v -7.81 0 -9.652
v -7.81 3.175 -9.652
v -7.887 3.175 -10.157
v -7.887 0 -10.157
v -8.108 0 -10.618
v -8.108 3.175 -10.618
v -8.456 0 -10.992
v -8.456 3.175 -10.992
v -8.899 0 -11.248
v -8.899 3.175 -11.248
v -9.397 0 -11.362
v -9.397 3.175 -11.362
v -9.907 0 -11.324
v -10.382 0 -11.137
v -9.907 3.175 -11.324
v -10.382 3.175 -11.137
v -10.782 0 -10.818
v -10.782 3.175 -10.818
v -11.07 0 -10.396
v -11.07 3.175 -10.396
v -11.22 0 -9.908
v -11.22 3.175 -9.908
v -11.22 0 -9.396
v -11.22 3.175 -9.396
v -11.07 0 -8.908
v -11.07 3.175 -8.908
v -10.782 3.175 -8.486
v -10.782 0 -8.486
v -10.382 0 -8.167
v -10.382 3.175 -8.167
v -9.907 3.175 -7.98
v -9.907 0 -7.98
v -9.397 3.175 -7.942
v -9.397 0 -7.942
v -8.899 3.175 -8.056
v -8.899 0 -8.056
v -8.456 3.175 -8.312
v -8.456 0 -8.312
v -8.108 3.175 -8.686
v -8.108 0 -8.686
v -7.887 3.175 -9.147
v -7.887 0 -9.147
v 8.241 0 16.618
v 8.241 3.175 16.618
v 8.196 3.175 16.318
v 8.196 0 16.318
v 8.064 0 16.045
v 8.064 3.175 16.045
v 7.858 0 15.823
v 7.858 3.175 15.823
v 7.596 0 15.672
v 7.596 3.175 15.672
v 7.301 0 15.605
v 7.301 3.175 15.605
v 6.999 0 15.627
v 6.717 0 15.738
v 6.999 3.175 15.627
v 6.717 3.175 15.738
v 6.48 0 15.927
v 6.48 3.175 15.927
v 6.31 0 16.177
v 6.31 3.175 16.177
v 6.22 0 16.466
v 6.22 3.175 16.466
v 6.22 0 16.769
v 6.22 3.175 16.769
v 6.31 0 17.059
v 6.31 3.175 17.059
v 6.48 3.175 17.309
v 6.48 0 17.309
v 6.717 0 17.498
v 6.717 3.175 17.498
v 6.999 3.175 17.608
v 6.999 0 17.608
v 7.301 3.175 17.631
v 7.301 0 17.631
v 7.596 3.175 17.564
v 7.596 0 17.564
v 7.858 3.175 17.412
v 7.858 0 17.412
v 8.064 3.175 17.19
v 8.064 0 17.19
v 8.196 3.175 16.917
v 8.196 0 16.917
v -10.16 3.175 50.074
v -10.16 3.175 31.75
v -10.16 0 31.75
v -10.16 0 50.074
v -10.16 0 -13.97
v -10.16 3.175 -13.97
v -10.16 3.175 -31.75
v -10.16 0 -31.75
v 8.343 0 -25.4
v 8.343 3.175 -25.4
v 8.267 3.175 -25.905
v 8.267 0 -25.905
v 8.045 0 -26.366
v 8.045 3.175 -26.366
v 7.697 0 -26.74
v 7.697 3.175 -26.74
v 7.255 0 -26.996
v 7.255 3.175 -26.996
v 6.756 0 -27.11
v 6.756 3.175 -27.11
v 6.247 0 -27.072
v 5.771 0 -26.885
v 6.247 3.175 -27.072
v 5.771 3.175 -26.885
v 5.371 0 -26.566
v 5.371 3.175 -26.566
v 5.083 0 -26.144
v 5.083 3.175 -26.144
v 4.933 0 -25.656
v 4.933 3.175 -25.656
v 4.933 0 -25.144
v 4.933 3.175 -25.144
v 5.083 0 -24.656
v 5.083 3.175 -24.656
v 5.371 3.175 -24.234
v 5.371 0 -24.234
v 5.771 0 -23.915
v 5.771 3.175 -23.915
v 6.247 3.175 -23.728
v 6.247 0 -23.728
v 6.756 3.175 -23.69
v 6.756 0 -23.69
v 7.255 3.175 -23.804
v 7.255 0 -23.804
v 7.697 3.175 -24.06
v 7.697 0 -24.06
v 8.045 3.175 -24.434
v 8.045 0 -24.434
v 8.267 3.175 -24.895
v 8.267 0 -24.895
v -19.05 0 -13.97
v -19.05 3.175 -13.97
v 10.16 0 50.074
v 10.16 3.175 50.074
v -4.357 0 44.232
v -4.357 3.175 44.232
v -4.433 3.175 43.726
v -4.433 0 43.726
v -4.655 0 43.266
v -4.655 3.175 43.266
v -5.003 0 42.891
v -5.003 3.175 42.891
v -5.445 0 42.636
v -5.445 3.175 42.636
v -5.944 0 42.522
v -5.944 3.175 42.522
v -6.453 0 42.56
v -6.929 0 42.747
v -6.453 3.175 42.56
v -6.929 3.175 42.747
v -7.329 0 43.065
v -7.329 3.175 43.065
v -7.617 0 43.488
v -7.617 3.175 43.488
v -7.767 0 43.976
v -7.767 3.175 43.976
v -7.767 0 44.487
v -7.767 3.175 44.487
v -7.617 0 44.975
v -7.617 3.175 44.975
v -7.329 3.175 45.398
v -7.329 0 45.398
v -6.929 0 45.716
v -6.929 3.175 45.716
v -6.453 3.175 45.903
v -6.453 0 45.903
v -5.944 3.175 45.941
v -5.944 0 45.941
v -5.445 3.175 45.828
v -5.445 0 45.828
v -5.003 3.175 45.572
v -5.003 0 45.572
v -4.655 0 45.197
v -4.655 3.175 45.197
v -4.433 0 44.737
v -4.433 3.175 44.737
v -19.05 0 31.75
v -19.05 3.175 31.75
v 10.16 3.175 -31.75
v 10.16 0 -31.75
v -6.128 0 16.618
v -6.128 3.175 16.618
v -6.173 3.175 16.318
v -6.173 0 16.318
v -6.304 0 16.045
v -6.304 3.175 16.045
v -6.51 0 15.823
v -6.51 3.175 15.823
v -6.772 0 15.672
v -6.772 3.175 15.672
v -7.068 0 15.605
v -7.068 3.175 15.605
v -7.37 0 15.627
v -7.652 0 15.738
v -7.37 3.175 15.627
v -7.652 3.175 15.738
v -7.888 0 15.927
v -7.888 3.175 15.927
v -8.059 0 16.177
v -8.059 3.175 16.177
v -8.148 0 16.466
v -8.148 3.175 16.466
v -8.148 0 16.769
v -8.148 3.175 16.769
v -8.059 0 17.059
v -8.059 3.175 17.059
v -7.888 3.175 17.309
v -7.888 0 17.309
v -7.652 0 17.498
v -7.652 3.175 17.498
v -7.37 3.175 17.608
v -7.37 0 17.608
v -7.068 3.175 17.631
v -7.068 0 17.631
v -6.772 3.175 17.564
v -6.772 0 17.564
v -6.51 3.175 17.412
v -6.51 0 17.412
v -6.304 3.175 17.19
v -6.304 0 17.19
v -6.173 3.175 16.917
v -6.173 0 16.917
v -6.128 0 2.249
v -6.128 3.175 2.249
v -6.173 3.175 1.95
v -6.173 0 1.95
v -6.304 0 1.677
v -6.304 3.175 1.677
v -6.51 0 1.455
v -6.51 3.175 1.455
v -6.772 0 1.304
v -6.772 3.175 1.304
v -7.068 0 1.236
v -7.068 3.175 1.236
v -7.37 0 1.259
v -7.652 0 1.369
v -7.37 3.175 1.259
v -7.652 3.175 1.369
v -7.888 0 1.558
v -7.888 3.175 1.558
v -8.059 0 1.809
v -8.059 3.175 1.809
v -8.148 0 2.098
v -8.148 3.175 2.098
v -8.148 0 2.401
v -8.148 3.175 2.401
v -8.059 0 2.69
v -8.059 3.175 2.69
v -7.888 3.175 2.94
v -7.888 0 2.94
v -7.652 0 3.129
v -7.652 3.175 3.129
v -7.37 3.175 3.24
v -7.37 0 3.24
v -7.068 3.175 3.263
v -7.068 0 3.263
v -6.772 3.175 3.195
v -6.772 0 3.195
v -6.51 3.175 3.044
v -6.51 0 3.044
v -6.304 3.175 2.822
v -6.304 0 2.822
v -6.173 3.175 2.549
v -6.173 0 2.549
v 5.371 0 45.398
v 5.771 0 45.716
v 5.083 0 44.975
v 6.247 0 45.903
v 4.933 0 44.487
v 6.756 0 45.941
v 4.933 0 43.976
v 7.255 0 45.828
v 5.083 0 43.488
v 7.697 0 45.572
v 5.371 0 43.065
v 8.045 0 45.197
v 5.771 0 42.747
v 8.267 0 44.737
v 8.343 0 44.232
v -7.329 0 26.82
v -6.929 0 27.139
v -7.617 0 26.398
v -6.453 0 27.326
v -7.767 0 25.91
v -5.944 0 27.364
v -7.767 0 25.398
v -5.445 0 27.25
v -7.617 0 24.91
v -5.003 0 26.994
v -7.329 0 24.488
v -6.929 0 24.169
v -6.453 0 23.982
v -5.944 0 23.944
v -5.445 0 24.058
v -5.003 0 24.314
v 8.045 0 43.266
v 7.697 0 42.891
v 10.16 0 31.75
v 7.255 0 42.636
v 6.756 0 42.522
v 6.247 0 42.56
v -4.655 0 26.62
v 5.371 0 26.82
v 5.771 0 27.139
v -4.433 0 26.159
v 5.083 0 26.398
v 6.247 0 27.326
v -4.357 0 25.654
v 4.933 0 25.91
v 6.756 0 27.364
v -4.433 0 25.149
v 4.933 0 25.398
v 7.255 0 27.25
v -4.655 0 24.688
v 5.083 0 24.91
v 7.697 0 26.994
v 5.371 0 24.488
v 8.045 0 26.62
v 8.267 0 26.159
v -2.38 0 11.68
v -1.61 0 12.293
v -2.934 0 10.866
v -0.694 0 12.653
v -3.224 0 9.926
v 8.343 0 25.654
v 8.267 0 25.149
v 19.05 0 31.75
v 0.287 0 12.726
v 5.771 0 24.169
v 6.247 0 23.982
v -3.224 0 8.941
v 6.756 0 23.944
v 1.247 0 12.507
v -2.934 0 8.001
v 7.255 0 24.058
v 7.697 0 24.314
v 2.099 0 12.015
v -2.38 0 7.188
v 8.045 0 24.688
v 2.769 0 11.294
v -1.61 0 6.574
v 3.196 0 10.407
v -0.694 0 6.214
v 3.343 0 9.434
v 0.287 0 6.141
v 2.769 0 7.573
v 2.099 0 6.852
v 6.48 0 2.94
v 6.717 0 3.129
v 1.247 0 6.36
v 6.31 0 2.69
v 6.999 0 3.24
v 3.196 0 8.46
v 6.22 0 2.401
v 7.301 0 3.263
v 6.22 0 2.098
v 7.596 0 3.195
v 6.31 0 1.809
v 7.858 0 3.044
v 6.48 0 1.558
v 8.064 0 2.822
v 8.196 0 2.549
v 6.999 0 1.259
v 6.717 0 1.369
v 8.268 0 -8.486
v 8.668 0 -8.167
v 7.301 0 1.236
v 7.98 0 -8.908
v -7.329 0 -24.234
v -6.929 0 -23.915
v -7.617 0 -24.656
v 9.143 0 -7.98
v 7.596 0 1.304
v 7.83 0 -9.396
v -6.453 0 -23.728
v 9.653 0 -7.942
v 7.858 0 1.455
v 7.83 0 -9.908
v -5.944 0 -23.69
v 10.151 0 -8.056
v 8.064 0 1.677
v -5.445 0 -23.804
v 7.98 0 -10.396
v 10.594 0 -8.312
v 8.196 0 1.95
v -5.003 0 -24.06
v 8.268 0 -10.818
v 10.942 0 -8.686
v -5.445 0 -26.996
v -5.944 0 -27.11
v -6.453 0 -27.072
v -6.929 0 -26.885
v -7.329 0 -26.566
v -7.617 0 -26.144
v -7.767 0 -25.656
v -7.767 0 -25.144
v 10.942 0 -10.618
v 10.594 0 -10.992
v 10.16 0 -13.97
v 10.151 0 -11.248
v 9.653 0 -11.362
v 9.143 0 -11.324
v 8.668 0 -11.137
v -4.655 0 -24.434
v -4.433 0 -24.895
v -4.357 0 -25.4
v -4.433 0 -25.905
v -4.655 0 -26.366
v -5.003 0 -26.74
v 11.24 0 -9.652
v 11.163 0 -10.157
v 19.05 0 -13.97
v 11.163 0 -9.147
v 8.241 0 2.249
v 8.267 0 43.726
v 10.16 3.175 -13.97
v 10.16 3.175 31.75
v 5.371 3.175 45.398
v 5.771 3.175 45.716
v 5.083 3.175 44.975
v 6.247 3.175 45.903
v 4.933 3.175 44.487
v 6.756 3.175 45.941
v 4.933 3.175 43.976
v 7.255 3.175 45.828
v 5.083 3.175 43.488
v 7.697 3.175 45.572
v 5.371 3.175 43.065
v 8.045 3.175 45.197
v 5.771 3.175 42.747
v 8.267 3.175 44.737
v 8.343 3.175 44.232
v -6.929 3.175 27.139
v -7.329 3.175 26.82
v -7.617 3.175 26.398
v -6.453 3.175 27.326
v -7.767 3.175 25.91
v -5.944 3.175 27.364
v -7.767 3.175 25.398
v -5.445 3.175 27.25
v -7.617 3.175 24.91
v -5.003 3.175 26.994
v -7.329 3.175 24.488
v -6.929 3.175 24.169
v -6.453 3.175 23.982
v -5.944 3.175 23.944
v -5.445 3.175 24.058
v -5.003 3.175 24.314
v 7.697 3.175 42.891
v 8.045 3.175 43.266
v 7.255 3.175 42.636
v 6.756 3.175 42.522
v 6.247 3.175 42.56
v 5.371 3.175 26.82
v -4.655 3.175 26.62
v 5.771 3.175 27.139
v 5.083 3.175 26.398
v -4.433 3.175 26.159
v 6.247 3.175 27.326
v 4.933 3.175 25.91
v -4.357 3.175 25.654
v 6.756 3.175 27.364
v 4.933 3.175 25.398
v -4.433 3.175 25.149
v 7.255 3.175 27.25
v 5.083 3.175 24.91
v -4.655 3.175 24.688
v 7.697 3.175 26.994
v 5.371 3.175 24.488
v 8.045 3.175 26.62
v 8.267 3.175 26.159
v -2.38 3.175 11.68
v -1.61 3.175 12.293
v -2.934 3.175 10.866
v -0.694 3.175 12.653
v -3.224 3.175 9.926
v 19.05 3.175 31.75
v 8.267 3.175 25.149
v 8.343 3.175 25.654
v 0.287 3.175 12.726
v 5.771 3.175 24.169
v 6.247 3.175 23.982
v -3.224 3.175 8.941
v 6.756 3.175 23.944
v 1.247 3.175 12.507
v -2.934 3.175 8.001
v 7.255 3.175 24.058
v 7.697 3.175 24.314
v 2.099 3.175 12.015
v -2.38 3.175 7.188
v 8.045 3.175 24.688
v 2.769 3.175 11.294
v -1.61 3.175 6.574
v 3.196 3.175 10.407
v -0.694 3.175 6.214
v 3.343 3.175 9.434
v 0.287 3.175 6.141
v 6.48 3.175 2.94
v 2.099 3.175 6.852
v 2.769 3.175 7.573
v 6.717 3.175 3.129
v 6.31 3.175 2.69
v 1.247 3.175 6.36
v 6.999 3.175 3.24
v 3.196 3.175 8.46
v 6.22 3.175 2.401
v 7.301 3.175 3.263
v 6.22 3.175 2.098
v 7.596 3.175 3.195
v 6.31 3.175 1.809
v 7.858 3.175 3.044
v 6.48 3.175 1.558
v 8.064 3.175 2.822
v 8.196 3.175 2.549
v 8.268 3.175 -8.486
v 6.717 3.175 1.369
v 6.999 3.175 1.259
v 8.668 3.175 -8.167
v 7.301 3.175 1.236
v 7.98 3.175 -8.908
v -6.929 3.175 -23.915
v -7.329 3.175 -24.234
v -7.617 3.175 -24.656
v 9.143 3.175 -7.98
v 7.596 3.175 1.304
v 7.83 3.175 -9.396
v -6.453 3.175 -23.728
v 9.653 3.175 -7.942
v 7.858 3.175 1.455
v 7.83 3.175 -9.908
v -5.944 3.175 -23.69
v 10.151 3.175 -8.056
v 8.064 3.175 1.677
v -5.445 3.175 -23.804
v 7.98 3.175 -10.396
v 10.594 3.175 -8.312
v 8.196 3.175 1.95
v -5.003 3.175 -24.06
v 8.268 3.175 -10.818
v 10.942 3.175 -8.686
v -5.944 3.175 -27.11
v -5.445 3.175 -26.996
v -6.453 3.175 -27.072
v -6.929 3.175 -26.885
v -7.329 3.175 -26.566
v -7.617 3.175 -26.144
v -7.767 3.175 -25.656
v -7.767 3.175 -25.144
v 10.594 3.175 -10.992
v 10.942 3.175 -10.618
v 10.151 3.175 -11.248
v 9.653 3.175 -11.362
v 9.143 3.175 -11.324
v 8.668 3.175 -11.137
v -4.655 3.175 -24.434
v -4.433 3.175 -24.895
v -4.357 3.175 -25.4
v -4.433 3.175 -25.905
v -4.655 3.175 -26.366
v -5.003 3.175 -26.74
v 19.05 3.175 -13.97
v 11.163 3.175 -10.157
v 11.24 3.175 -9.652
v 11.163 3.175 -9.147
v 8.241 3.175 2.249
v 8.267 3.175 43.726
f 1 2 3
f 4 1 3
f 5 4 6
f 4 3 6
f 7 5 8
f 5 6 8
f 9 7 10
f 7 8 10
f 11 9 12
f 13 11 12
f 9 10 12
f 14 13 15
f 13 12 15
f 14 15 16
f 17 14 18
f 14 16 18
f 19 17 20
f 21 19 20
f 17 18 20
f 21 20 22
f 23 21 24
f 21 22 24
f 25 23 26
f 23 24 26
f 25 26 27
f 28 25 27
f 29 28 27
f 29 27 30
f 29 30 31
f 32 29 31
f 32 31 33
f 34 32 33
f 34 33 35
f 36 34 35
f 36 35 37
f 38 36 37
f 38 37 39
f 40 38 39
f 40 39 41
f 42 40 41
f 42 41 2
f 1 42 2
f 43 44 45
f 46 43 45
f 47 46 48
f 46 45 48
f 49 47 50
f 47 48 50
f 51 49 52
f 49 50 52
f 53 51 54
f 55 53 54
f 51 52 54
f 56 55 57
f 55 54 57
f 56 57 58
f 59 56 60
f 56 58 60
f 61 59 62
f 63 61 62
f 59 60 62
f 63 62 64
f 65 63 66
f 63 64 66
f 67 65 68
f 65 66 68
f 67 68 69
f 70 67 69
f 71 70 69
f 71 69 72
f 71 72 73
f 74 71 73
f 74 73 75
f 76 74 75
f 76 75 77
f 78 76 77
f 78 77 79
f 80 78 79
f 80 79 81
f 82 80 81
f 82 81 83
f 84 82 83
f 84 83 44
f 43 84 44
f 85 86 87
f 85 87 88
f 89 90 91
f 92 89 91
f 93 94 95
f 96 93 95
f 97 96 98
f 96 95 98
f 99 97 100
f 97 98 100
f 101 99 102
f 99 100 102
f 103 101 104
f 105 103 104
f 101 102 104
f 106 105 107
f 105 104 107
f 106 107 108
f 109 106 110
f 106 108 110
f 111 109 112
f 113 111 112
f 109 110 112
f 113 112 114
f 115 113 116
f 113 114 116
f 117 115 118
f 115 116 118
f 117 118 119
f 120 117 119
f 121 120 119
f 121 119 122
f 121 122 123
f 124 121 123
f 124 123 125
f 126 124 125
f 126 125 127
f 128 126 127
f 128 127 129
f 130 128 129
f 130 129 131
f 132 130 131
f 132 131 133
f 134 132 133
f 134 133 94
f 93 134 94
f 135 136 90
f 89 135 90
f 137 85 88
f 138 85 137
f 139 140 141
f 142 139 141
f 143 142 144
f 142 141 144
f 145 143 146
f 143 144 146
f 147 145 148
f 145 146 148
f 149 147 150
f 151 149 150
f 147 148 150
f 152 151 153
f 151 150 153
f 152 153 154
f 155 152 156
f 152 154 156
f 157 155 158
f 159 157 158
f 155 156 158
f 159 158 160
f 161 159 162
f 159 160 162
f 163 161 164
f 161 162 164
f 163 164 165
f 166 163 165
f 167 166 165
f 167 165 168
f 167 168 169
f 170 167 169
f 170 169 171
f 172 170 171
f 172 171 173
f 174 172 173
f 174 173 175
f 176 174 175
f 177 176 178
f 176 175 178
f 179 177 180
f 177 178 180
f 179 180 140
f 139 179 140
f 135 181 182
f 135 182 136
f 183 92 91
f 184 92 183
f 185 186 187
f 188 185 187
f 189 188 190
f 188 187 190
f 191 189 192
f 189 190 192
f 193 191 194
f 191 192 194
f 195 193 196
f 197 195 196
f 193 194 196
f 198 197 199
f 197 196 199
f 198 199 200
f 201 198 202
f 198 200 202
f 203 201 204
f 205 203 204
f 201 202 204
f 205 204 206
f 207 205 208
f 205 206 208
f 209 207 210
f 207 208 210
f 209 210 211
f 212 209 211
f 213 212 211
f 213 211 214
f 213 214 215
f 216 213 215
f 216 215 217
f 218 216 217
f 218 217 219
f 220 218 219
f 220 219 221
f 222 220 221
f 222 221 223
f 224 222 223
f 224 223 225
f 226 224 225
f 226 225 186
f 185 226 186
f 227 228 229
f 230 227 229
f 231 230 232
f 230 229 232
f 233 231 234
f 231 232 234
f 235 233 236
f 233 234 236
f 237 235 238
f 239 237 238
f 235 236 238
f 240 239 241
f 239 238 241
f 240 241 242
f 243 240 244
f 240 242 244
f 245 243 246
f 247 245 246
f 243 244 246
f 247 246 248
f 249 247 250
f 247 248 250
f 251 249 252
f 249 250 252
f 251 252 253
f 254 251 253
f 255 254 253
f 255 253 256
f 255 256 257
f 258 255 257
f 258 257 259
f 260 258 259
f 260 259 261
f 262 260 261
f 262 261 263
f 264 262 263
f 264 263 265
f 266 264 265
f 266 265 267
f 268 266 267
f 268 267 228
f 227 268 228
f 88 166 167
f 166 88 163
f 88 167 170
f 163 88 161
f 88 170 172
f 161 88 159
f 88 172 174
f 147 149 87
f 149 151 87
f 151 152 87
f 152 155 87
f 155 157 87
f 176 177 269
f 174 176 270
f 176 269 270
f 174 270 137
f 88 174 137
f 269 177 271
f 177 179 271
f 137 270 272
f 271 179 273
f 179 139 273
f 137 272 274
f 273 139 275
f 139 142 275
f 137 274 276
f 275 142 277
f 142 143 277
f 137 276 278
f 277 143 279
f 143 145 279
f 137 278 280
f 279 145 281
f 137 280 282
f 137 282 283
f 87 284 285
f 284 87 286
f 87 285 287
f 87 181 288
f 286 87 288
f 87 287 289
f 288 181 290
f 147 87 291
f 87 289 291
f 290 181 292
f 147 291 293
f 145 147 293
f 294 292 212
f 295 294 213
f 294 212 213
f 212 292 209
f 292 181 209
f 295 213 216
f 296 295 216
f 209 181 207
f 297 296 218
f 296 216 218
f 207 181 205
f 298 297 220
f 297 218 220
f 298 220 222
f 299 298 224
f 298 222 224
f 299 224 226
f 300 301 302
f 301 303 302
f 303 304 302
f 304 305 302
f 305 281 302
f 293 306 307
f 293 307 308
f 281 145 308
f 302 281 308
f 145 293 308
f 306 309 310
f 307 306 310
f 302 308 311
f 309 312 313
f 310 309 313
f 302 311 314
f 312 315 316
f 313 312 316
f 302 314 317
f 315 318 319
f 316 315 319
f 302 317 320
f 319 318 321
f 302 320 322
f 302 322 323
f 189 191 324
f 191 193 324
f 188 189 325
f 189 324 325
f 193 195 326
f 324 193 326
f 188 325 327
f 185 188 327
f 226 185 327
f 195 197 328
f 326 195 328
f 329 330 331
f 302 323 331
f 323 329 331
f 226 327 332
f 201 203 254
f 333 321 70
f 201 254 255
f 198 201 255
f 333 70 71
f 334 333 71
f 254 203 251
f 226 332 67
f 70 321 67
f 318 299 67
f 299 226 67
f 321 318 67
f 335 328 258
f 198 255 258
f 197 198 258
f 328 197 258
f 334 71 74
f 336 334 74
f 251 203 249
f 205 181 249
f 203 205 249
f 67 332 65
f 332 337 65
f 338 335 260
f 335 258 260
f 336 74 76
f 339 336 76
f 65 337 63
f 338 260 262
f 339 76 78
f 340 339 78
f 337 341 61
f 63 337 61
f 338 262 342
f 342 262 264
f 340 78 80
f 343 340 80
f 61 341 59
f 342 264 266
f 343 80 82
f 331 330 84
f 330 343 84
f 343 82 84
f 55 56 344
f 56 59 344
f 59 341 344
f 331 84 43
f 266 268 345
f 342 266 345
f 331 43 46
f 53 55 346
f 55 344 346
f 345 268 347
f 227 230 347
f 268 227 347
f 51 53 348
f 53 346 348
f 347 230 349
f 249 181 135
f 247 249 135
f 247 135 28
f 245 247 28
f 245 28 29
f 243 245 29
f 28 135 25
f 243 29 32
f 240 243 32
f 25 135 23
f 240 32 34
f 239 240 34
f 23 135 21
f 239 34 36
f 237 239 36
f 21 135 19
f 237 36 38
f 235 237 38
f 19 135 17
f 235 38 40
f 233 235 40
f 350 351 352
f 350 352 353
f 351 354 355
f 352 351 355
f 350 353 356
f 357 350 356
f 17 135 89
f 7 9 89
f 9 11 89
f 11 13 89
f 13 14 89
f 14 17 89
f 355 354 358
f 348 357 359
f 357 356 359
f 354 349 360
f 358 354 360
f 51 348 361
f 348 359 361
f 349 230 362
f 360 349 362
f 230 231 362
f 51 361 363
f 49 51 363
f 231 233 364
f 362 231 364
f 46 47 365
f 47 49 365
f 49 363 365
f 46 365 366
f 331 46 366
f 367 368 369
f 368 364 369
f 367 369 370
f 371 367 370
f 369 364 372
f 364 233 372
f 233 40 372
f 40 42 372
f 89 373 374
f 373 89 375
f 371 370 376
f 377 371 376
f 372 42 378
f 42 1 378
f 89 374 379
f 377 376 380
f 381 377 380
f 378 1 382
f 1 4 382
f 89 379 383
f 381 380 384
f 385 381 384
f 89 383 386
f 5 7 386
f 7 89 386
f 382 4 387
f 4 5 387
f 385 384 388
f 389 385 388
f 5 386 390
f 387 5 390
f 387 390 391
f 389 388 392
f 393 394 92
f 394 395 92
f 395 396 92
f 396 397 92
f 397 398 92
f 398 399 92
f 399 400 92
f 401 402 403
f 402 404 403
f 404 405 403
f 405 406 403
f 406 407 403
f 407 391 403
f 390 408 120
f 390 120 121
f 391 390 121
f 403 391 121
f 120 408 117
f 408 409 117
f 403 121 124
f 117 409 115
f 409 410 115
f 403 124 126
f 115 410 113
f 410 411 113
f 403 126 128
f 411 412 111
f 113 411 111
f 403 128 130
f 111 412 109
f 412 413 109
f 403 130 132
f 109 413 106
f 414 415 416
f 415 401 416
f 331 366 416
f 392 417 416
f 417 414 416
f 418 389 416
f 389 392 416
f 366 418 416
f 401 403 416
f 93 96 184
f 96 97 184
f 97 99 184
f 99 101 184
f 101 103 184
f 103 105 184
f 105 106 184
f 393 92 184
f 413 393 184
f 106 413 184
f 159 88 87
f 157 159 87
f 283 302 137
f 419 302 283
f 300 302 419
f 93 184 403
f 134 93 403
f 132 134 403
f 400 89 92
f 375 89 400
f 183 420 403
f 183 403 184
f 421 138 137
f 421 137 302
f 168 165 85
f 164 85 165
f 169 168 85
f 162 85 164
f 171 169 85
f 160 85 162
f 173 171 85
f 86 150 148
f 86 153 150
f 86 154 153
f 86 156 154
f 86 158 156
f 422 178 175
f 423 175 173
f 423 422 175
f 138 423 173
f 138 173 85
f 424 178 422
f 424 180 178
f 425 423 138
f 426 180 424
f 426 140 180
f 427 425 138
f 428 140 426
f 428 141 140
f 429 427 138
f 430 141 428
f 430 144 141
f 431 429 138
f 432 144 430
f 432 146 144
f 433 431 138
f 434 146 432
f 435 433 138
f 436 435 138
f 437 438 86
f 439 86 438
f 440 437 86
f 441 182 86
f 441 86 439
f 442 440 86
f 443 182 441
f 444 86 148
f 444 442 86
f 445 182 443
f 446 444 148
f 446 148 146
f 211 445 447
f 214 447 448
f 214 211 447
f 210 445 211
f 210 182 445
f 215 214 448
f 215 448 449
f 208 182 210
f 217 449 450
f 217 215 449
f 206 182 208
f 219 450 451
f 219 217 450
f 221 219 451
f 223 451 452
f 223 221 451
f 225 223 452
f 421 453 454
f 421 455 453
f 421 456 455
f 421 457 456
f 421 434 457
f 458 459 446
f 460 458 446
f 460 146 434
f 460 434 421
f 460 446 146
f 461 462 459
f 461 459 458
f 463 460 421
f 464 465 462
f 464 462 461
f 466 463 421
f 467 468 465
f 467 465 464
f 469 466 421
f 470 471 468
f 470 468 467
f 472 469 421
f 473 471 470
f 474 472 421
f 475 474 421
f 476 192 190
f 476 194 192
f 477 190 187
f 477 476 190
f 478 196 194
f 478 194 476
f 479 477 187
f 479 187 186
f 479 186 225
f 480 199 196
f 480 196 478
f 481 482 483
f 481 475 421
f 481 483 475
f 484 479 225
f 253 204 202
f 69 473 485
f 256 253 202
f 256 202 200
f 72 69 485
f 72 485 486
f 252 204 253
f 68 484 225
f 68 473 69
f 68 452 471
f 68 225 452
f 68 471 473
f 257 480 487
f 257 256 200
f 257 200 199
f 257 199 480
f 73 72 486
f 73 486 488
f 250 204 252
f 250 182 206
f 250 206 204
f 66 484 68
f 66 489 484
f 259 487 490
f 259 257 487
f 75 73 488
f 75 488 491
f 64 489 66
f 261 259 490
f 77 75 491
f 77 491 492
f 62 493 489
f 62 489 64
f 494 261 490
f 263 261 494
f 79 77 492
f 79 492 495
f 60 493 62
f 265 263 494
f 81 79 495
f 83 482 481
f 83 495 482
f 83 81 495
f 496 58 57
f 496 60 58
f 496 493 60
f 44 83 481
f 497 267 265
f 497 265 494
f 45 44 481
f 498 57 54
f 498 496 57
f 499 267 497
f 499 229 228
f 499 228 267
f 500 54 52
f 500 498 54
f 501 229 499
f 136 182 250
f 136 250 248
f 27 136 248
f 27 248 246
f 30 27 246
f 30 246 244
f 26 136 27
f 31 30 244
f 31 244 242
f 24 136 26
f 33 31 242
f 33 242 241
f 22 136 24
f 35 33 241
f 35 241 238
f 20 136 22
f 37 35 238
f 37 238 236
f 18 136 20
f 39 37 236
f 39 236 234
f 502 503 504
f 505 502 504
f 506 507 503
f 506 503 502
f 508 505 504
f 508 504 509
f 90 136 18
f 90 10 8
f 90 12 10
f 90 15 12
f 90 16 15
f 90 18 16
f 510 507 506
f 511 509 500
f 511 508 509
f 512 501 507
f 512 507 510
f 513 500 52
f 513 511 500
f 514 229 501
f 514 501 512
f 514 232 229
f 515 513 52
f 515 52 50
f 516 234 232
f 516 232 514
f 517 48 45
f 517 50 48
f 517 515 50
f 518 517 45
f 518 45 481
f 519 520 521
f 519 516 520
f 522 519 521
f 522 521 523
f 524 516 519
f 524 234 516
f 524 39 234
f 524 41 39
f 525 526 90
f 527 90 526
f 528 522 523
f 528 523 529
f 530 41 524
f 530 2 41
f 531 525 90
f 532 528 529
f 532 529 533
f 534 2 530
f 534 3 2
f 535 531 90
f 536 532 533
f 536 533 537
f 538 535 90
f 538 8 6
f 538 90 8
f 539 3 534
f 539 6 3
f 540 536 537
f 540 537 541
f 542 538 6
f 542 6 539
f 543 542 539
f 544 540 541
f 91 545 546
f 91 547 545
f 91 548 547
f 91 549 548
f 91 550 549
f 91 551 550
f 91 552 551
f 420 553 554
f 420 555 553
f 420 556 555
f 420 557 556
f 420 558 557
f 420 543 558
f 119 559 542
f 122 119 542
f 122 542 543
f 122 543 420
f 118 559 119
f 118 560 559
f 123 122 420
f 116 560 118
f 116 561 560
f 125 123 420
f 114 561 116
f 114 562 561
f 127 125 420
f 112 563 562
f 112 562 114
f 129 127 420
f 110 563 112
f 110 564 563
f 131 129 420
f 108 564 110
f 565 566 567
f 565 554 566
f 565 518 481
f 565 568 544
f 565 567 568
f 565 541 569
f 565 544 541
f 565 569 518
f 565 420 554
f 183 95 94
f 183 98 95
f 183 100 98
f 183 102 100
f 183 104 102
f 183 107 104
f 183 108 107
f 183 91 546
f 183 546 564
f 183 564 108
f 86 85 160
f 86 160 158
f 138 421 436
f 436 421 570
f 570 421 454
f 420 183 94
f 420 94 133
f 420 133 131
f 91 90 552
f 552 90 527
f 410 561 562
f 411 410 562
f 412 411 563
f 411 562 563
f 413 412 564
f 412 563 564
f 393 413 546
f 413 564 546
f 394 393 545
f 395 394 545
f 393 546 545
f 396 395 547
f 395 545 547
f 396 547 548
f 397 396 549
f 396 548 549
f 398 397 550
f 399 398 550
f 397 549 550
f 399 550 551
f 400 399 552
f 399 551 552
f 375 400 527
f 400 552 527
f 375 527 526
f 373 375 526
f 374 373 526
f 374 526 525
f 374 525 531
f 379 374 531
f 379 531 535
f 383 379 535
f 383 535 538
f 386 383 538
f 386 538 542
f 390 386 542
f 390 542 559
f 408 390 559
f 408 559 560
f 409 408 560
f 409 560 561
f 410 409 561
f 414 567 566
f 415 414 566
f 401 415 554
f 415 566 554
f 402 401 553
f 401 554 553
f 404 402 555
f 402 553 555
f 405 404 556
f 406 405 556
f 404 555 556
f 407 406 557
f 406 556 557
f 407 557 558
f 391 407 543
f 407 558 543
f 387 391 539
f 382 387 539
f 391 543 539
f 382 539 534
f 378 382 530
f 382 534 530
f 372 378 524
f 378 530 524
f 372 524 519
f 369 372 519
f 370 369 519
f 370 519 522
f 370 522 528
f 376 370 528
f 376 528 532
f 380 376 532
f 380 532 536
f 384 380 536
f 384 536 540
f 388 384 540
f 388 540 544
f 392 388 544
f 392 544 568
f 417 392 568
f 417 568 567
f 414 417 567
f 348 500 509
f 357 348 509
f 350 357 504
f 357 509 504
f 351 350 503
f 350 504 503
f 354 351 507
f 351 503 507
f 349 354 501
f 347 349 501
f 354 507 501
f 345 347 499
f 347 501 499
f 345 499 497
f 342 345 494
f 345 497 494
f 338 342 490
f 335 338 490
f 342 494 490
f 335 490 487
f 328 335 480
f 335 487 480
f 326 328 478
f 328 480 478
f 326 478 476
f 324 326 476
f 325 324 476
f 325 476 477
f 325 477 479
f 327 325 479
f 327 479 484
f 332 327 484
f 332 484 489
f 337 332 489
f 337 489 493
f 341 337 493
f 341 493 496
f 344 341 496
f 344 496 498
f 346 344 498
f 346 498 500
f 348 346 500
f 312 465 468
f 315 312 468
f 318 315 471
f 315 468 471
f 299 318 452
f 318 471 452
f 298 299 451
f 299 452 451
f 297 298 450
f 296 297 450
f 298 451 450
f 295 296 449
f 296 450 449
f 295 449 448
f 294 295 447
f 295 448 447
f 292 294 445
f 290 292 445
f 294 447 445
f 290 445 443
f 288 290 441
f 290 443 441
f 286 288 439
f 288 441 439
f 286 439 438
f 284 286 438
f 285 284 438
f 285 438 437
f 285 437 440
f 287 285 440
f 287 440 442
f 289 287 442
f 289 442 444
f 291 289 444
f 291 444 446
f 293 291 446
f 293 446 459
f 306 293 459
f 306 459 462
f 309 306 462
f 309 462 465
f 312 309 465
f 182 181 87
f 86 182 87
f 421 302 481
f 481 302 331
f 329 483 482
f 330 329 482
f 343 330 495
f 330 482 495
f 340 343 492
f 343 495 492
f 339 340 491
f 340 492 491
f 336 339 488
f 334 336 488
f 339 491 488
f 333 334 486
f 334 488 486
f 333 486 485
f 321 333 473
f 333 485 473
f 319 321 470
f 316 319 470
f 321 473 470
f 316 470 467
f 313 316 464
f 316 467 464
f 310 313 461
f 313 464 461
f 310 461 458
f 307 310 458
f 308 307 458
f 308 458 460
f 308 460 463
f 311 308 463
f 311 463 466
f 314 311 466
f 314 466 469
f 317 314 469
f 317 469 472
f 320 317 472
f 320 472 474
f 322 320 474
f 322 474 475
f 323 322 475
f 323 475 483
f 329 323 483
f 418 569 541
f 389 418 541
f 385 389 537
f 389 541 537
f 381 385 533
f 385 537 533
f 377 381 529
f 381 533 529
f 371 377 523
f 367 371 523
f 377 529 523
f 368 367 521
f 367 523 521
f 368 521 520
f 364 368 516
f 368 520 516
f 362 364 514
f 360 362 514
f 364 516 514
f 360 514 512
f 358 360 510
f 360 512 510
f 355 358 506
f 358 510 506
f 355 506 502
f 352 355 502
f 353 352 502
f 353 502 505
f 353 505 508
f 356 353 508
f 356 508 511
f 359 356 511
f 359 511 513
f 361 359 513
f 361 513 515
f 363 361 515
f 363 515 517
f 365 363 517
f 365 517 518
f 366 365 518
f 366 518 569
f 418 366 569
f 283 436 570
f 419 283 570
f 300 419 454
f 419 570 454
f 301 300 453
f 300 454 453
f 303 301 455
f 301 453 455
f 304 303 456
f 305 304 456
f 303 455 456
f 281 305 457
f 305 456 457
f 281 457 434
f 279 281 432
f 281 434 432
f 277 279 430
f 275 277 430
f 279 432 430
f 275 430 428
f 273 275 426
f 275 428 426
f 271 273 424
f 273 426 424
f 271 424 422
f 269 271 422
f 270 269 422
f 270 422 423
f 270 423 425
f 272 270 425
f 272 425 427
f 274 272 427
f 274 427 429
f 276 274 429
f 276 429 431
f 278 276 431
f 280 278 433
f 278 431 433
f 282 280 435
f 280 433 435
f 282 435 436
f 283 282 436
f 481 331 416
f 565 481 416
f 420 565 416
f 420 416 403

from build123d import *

# Parameters (mm, degrees)
SKETCH1_W                          = 38.1
SKETCH1_H                          = 63.5
BOSS_EXTRUDE1_DEPTH                = 3.175
SKETCH3_R                          = 3.302
SKETCH3_R_2                        = 1.016
HOLES_FOR_SERVO_MOUNT_DEPTH        = 4.175
SKETCH2_R                          = 1.7145
HOLES_FOR_TILT_SERVO_BRACKET_DEPTH = 4.175
SKETCH4_R                          = 1.7145
HOLES_FOR_PILLOW_BRACKET_DEPTH     = 4.175
SKETCH5_W                          = 8.89
SKETCH5_H                          = 17.78
CUT_EXTRUDE1_DEPTH                 = 4.175
SKETCH10_R                         = 1.7145
BOSS_EXTRUDE3_DEPTH                = 3.175


with BuildPart() as part:
    # Sketch1 → Boss-Extrude1 (new body)
    with BuildSketch(Plane(origin=(0, 0, 0), x_dir=(1, 0, 0), z_dir=(0, 1, 0))):
        Rectangle(SKETCH1_W, SKETCH1_H)
    extrude(amount=BOSS_EXTRUDE1_DEPTH)

    # Sketch3 → holes for servo mount (cut, through all)
    with BuildSketch(Plane(origin=(0, 3.175, 0), x_dir=(1, 0, 0), z_dir=(0, 1, 0))):
        with Locations((0.040685132, -9.433577206)):
            Circle(SKETCH3_R)
        with Locations((7.224890029, -16.617782103)):
            Circle(SKETCH3_R_2)
        with Locations((-7.143519765, -2.249372309)):
            Circle(SKETCH3_R_2)
        with Locations((-7.143519765, -16.617782103)):
            Circle(SKETCH3_R_2)
        with Locations((7.224890029, -2.249372309)):
            Circle(SKETCH3_R_2)
    extrude(amount=-HOLES_FOR_SERVO_MOUNT_DEPTH, mode=Mode.SUBTRACT)

    # Sketch2 → holes for tilt servo bracket (cut, through all)
    with BuildSketch(Plane(origin=(0, 3.175, 0), x_dir=(1, 0, 0), z_dir=(0, 1, 0))):
        with Locations((-6.071821378, 25.4)):
            Circle(SKETCH2_R)
        with Locations((6.628178622, 25.4)):
            Circle(SKETCH2_R)
        with Locations((6.628178622, -25.654)):
            Circle(SKETCH2_R)
        with Locations((-6.071821378, -25.654)):
            Circle(SKETCH2_R)
    extrude(amount=-HOLES_FOR_TILT_SERVO_BRACKET_DEPTH, mode=Mode.SUBTRACT)

    # Sketch4 → holes for pillow bracket (cut, through all)
    with BuildSketch(Plane(origin=(0, 3.175, 0), x_dir=(1, 0, 0), z_dir=(0, 1, 0))):
        with Locations((9.525, 9.652)):
            Circle(SKETCH4_R)
        with Locations((-9.525, 9.652)):
            Circle(SKETCH4_R)
    extrude(amount=-HOLES_FOR_PILLOW_BRACKET_DEPTH, mode=Mode.SUBTRACT)

    # Sketch5 → Cut-Extrude1 (cut, through all)
    with BuildSketch(Plane(origin=(0, 3.175, 0), x_dir=(1, 0, 0), z_dir=(0, 1, 0))):
        with Locations((-14.605, 22.86)):
            Rectangle(SKETCH5_W, SKETCH5_H)
    cut_extrude1 = extrude(amount=-CUT_EXTRUDE1_DEPTH, mode=Mode.SUBTRACT)

    # Mirror1: Cut-Extrude1 across plane
    add(cut_extrude1.mirror(Plane(origin=(0, 0, 0), x_dir=(0, 0, 1), z_dir=(1, 0, 0))), mode=Mode.SUBTRACT)

    # Sketch10 → Boss-Extrude3 (add)
    with BuildSketch(Plane(origin=(0, 3.175, 0), x_dir=(1, 0, 0), z_dir=(0, 1, 0))):
        Polygon((0, -31.75), (-10.16, -31.75), (-10.16, -50.073577206), (10.16, -50.073577206), (10.16, -31.75), align=None)
        with Locations((-6.071821378, -44.231577206)):
            Circle(SKETCH10_R, mode=Mode.SUBTRACT)
        with Locations((6.628178622, -44.231577206)):
            Circle(SKETCH10_R, mode=Mode.SUBTRACT)
    extrude(amount=-BOSS_EXTRUDE3_DEPTH)


solid = part.part
